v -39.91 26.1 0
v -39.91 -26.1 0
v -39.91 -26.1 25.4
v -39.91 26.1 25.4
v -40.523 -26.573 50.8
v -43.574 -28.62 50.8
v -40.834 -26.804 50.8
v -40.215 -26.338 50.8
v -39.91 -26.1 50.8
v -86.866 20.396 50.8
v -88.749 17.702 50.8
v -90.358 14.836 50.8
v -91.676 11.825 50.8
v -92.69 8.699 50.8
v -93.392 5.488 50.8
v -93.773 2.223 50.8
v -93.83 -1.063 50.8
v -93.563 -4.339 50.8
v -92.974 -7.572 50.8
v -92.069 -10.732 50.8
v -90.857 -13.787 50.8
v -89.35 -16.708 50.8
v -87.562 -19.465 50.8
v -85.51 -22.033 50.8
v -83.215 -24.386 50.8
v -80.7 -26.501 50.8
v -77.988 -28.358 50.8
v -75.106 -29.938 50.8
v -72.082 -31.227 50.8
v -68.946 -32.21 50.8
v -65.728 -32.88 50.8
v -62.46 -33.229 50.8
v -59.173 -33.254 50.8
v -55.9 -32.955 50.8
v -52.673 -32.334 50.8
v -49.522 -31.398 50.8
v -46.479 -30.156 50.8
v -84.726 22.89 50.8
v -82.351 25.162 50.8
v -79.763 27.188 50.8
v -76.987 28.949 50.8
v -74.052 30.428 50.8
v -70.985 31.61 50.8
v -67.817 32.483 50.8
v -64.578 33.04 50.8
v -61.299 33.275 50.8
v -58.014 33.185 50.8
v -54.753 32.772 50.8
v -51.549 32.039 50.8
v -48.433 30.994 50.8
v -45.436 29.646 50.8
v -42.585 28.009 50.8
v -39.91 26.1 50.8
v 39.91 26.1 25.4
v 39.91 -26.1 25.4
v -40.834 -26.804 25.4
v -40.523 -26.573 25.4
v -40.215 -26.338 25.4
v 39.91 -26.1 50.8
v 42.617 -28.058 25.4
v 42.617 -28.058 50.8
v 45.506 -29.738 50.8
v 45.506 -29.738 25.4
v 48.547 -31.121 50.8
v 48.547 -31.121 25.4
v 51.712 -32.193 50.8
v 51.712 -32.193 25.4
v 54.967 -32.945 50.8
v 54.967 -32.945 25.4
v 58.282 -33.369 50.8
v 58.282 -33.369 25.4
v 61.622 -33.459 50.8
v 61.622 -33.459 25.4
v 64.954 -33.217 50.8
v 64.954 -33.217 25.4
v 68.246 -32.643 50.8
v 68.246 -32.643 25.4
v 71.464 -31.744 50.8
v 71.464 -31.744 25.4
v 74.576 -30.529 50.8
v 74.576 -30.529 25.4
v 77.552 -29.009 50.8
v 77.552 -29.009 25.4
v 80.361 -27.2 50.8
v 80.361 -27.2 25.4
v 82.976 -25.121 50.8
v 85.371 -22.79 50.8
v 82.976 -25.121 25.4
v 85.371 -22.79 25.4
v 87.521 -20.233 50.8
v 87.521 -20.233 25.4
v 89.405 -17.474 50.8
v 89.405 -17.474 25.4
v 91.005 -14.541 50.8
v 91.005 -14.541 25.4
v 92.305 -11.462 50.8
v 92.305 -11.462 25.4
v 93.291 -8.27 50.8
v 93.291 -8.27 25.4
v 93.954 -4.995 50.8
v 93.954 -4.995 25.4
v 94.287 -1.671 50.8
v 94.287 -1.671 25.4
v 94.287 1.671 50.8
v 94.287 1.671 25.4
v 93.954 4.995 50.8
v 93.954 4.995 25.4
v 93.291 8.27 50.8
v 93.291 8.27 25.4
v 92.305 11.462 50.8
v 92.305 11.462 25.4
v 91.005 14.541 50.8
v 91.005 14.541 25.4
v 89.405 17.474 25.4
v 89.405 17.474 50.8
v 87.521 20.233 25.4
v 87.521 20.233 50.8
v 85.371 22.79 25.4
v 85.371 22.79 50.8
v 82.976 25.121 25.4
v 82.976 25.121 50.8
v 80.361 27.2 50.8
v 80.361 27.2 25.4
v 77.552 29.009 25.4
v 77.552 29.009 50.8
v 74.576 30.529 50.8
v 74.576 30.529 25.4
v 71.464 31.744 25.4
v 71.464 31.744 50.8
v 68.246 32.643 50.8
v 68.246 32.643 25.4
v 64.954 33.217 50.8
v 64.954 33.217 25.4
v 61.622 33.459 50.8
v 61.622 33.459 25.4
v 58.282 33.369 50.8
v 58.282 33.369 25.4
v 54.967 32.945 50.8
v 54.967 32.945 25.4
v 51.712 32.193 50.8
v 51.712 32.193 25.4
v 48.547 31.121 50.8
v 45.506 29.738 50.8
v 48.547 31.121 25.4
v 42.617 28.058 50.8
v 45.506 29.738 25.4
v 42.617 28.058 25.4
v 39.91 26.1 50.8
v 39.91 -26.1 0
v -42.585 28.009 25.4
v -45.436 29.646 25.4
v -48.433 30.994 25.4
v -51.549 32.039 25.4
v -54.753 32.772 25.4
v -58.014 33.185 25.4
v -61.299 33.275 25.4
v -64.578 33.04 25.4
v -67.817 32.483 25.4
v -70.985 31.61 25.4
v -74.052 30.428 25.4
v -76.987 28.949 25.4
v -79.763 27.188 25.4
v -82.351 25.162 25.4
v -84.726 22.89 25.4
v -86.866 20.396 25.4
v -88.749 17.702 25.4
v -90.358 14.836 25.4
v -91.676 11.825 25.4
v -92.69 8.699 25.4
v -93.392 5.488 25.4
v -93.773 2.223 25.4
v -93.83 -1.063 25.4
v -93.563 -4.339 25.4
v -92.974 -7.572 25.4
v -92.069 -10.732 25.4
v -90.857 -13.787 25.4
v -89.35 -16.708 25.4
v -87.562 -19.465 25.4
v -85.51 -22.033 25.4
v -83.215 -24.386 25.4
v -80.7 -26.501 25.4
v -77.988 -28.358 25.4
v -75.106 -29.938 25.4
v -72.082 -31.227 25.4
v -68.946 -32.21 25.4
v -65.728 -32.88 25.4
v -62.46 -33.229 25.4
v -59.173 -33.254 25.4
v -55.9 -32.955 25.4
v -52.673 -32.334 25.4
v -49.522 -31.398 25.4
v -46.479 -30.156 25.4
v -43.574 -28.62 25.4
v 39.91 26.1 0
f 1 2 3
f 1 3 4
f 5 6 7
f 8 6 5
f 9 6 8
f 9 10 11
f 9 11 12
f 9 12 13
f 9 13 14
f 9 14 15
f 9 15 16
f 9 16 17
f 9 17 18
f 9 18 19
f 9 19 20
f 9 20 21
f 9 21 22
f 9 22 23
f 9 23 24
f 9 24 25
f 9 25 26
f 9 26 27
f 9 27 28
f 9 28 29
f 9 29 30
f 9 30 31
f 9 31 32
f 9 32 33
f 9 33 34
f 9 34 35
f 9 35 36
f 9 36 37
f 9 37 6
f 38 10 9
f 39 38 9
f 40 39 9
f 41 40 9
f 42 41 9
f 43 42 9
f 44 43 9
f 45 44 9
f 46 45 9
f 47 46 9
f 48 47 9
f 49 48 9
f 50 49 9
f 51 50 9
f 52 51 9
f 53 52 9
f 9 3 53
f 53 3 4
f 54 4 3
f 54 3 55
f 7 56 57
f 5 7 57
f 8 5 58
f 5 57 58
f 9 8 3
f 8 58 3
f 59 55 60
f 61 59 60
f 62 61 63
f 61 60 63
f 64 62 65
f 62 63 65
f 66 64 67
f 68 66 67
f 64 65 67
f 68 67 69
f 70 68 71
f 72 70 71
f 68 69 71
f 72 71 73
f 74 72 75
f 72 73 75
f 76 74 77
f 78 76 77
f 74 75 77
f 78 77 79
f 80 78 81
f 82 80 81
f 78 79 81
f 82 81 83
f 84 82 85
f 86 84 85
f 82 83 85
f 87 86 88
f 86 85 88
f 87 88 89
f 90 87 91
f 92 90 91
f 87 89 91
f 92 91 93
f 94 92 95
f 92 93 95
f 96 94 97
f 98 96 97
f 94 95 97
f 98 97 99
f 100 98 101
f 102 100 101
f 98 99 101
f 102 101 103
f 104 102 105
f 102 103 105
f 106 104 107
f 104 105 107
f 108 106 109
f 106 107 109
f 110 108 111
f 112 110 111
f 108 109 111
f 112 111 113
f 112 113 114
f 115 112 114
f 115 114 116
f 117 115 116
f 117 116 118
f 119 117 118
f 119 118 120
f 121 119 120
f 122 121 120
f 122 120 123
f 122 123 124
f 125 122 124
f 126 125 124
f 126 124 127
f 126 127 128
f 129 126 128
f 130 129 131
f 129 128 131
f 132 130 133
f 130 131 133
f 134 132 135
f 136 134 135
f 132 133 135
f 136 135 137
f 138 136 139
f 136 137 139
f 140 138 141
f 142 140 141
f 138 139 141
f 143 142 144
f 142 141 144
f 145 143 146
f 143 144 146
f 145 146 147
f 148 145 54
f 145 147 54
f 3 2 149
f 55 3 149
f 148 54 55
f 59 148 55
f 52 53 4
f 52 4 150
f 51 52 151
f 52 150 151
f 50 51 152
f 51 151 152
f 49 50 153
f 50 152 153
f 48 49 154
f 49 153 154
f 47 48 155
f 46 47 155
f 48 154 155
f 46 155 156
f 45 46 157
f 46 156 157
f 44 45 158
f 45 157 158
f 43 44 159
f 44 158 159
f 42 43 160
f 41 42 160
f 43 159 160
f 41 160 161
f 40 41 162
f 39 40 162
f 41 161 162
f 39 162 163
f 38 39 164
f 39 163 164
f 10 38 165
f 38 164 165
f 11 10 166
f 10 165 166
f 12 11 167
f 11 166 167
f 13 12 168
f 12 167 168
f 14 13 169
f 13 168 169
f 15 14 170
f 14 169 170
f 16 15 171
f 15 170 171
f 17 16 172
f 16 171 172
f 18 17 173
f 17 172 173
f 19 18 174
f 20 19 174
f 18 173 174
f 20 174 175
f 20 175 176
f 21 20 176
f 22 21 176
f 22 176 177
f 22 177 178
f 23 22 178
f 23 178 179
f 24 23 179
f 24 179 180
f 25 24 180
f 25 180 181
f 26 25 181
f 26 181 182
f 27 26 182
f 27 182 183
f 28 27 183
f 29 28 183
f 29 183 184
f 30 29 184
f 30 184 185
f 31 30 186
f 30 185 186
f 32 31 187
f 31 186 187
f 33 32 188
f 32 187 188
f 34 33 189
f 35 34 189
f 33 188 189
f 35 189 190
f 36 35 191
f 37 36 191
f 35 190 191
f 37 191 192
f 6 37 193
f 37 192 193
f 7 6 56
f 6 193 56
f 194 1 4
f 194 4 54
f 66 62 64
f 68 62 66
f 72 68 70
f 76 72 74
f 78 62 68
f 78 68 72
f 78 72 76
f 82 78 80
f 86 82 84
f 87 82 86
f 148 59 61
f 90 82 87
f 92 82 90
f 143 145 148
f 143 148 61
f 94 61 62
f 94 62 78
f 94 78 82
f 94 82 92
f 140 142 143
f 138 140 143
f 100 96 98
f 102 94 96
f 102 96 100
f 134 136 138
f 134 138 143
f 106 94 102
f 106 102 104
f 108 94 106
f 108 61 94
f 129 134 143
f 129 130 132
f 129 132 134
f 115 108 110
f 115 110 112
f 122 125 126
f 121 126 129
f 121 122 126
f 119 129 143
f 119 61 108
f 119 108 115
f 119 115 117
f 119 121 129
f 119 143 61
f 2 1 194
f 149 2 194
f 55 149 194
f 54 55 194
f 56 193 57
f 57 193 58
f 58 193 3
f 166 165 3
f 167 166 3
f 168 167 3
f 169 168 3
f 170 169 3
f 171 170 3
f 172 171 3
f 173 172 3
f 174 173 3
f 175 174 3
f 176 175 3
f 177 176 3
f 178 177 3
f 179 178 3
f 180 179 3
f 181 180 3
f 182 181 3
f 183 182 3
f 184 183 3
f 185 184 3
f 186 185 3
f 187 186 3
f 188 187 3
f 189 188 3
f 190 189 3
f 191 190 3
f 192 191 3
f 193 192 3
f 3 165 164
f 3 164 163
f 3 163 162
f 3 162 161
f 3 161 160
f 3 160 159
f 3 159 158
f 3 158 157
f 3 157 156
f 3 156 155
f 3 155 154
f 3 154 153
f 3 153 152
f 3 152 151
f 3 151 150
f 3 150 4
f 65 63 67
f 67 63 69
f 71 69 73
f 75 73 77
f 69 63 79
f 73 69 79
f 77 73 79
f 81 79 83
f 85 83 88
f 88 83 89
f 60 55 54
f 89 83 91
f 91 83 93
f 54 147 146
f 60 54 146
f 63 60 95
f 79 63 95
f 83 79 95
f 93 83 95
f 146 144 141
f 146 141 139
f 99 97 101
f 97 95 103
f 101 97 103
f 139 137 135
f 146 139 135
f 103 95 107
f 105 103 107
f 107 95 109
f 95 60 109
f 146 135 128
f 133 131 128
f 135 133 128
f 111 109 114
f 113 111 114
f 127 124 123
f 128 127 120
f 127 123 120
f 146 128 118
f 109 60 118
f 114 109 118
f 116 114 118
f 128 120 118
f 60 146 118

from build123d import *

# Parameters (mm, degrees)
F0_W     = 79.8208117485
F0_H     = 52.1990358829
F1_DEPTH = 25.4
F3_DEPTH = 25.4
F4_DEPTH = 25.4


with BuildPart() as f1:
    # F0 (on Top) → F1 (new body)
    with BuildSketch(Plane.XY):
        Rectangle(F0_W, F0_H)
    extrude(amount=F1_DEPTH)

    # F2 (on face) → F3 (join)
    with BuildSketch(Plane.XY.offset(25.4)):
        with BuildLine():
            Line((-39.9104058743, -26.0995179415), (-39.9104058743, 26.0995179415))
            ThreePointArc((-39.9104058743, 26.0995179415), (-93.8421517759, 0.5807712398), (-40.8336892724, -26.8043077675))
            ThreePointArc((-40.8336892724, -26.8043077675), (-40.36897279, -26.4559408587), (-39.9104058743, -26.0995179415))
        make_face()
        with BuildLine():
            ThreePointArc((39.9104058743, -26.0995179415), (94.3291487358, 0), (39.9104058743, 26.0995179415))
            Line((39.9104058743, 26.0995179415), (39.9104058743, -26.0995179415))
        make_face()
    extrude(amount=F3_DEPTH)

    # F2 (on face) → F4 (join)
    with BuildSketch(Plane.XY.offset(25.4)):
        with BuildLine():
            Line((-39.9104058743, -26.0995179415), (-39.9104058743, 26.0995179415))
            ThreePointArc((-39.9104058743, 26.0995179415), (-93.8421517759, 0.5807712398), (-40.8336892724, -26.8043077675))
            ThreePointArc((-40.8336892724, -26.8043077675), (-40.36897279, -26.4559408587), (-39.9104058743, -26.0995179415))
        make_face()
        with BuildLine():
            ThreePointArc((39.9104058743, -26.0995179415), (94.3291487358, 0), (39.9104058743, 26.0995179415))
            Line((39.9104058743, 26.0995179415), (39.9104058743, -26.0995179415))
        make_face()
    extrude(amount=F4_DEPTH)


solid = f1.part
